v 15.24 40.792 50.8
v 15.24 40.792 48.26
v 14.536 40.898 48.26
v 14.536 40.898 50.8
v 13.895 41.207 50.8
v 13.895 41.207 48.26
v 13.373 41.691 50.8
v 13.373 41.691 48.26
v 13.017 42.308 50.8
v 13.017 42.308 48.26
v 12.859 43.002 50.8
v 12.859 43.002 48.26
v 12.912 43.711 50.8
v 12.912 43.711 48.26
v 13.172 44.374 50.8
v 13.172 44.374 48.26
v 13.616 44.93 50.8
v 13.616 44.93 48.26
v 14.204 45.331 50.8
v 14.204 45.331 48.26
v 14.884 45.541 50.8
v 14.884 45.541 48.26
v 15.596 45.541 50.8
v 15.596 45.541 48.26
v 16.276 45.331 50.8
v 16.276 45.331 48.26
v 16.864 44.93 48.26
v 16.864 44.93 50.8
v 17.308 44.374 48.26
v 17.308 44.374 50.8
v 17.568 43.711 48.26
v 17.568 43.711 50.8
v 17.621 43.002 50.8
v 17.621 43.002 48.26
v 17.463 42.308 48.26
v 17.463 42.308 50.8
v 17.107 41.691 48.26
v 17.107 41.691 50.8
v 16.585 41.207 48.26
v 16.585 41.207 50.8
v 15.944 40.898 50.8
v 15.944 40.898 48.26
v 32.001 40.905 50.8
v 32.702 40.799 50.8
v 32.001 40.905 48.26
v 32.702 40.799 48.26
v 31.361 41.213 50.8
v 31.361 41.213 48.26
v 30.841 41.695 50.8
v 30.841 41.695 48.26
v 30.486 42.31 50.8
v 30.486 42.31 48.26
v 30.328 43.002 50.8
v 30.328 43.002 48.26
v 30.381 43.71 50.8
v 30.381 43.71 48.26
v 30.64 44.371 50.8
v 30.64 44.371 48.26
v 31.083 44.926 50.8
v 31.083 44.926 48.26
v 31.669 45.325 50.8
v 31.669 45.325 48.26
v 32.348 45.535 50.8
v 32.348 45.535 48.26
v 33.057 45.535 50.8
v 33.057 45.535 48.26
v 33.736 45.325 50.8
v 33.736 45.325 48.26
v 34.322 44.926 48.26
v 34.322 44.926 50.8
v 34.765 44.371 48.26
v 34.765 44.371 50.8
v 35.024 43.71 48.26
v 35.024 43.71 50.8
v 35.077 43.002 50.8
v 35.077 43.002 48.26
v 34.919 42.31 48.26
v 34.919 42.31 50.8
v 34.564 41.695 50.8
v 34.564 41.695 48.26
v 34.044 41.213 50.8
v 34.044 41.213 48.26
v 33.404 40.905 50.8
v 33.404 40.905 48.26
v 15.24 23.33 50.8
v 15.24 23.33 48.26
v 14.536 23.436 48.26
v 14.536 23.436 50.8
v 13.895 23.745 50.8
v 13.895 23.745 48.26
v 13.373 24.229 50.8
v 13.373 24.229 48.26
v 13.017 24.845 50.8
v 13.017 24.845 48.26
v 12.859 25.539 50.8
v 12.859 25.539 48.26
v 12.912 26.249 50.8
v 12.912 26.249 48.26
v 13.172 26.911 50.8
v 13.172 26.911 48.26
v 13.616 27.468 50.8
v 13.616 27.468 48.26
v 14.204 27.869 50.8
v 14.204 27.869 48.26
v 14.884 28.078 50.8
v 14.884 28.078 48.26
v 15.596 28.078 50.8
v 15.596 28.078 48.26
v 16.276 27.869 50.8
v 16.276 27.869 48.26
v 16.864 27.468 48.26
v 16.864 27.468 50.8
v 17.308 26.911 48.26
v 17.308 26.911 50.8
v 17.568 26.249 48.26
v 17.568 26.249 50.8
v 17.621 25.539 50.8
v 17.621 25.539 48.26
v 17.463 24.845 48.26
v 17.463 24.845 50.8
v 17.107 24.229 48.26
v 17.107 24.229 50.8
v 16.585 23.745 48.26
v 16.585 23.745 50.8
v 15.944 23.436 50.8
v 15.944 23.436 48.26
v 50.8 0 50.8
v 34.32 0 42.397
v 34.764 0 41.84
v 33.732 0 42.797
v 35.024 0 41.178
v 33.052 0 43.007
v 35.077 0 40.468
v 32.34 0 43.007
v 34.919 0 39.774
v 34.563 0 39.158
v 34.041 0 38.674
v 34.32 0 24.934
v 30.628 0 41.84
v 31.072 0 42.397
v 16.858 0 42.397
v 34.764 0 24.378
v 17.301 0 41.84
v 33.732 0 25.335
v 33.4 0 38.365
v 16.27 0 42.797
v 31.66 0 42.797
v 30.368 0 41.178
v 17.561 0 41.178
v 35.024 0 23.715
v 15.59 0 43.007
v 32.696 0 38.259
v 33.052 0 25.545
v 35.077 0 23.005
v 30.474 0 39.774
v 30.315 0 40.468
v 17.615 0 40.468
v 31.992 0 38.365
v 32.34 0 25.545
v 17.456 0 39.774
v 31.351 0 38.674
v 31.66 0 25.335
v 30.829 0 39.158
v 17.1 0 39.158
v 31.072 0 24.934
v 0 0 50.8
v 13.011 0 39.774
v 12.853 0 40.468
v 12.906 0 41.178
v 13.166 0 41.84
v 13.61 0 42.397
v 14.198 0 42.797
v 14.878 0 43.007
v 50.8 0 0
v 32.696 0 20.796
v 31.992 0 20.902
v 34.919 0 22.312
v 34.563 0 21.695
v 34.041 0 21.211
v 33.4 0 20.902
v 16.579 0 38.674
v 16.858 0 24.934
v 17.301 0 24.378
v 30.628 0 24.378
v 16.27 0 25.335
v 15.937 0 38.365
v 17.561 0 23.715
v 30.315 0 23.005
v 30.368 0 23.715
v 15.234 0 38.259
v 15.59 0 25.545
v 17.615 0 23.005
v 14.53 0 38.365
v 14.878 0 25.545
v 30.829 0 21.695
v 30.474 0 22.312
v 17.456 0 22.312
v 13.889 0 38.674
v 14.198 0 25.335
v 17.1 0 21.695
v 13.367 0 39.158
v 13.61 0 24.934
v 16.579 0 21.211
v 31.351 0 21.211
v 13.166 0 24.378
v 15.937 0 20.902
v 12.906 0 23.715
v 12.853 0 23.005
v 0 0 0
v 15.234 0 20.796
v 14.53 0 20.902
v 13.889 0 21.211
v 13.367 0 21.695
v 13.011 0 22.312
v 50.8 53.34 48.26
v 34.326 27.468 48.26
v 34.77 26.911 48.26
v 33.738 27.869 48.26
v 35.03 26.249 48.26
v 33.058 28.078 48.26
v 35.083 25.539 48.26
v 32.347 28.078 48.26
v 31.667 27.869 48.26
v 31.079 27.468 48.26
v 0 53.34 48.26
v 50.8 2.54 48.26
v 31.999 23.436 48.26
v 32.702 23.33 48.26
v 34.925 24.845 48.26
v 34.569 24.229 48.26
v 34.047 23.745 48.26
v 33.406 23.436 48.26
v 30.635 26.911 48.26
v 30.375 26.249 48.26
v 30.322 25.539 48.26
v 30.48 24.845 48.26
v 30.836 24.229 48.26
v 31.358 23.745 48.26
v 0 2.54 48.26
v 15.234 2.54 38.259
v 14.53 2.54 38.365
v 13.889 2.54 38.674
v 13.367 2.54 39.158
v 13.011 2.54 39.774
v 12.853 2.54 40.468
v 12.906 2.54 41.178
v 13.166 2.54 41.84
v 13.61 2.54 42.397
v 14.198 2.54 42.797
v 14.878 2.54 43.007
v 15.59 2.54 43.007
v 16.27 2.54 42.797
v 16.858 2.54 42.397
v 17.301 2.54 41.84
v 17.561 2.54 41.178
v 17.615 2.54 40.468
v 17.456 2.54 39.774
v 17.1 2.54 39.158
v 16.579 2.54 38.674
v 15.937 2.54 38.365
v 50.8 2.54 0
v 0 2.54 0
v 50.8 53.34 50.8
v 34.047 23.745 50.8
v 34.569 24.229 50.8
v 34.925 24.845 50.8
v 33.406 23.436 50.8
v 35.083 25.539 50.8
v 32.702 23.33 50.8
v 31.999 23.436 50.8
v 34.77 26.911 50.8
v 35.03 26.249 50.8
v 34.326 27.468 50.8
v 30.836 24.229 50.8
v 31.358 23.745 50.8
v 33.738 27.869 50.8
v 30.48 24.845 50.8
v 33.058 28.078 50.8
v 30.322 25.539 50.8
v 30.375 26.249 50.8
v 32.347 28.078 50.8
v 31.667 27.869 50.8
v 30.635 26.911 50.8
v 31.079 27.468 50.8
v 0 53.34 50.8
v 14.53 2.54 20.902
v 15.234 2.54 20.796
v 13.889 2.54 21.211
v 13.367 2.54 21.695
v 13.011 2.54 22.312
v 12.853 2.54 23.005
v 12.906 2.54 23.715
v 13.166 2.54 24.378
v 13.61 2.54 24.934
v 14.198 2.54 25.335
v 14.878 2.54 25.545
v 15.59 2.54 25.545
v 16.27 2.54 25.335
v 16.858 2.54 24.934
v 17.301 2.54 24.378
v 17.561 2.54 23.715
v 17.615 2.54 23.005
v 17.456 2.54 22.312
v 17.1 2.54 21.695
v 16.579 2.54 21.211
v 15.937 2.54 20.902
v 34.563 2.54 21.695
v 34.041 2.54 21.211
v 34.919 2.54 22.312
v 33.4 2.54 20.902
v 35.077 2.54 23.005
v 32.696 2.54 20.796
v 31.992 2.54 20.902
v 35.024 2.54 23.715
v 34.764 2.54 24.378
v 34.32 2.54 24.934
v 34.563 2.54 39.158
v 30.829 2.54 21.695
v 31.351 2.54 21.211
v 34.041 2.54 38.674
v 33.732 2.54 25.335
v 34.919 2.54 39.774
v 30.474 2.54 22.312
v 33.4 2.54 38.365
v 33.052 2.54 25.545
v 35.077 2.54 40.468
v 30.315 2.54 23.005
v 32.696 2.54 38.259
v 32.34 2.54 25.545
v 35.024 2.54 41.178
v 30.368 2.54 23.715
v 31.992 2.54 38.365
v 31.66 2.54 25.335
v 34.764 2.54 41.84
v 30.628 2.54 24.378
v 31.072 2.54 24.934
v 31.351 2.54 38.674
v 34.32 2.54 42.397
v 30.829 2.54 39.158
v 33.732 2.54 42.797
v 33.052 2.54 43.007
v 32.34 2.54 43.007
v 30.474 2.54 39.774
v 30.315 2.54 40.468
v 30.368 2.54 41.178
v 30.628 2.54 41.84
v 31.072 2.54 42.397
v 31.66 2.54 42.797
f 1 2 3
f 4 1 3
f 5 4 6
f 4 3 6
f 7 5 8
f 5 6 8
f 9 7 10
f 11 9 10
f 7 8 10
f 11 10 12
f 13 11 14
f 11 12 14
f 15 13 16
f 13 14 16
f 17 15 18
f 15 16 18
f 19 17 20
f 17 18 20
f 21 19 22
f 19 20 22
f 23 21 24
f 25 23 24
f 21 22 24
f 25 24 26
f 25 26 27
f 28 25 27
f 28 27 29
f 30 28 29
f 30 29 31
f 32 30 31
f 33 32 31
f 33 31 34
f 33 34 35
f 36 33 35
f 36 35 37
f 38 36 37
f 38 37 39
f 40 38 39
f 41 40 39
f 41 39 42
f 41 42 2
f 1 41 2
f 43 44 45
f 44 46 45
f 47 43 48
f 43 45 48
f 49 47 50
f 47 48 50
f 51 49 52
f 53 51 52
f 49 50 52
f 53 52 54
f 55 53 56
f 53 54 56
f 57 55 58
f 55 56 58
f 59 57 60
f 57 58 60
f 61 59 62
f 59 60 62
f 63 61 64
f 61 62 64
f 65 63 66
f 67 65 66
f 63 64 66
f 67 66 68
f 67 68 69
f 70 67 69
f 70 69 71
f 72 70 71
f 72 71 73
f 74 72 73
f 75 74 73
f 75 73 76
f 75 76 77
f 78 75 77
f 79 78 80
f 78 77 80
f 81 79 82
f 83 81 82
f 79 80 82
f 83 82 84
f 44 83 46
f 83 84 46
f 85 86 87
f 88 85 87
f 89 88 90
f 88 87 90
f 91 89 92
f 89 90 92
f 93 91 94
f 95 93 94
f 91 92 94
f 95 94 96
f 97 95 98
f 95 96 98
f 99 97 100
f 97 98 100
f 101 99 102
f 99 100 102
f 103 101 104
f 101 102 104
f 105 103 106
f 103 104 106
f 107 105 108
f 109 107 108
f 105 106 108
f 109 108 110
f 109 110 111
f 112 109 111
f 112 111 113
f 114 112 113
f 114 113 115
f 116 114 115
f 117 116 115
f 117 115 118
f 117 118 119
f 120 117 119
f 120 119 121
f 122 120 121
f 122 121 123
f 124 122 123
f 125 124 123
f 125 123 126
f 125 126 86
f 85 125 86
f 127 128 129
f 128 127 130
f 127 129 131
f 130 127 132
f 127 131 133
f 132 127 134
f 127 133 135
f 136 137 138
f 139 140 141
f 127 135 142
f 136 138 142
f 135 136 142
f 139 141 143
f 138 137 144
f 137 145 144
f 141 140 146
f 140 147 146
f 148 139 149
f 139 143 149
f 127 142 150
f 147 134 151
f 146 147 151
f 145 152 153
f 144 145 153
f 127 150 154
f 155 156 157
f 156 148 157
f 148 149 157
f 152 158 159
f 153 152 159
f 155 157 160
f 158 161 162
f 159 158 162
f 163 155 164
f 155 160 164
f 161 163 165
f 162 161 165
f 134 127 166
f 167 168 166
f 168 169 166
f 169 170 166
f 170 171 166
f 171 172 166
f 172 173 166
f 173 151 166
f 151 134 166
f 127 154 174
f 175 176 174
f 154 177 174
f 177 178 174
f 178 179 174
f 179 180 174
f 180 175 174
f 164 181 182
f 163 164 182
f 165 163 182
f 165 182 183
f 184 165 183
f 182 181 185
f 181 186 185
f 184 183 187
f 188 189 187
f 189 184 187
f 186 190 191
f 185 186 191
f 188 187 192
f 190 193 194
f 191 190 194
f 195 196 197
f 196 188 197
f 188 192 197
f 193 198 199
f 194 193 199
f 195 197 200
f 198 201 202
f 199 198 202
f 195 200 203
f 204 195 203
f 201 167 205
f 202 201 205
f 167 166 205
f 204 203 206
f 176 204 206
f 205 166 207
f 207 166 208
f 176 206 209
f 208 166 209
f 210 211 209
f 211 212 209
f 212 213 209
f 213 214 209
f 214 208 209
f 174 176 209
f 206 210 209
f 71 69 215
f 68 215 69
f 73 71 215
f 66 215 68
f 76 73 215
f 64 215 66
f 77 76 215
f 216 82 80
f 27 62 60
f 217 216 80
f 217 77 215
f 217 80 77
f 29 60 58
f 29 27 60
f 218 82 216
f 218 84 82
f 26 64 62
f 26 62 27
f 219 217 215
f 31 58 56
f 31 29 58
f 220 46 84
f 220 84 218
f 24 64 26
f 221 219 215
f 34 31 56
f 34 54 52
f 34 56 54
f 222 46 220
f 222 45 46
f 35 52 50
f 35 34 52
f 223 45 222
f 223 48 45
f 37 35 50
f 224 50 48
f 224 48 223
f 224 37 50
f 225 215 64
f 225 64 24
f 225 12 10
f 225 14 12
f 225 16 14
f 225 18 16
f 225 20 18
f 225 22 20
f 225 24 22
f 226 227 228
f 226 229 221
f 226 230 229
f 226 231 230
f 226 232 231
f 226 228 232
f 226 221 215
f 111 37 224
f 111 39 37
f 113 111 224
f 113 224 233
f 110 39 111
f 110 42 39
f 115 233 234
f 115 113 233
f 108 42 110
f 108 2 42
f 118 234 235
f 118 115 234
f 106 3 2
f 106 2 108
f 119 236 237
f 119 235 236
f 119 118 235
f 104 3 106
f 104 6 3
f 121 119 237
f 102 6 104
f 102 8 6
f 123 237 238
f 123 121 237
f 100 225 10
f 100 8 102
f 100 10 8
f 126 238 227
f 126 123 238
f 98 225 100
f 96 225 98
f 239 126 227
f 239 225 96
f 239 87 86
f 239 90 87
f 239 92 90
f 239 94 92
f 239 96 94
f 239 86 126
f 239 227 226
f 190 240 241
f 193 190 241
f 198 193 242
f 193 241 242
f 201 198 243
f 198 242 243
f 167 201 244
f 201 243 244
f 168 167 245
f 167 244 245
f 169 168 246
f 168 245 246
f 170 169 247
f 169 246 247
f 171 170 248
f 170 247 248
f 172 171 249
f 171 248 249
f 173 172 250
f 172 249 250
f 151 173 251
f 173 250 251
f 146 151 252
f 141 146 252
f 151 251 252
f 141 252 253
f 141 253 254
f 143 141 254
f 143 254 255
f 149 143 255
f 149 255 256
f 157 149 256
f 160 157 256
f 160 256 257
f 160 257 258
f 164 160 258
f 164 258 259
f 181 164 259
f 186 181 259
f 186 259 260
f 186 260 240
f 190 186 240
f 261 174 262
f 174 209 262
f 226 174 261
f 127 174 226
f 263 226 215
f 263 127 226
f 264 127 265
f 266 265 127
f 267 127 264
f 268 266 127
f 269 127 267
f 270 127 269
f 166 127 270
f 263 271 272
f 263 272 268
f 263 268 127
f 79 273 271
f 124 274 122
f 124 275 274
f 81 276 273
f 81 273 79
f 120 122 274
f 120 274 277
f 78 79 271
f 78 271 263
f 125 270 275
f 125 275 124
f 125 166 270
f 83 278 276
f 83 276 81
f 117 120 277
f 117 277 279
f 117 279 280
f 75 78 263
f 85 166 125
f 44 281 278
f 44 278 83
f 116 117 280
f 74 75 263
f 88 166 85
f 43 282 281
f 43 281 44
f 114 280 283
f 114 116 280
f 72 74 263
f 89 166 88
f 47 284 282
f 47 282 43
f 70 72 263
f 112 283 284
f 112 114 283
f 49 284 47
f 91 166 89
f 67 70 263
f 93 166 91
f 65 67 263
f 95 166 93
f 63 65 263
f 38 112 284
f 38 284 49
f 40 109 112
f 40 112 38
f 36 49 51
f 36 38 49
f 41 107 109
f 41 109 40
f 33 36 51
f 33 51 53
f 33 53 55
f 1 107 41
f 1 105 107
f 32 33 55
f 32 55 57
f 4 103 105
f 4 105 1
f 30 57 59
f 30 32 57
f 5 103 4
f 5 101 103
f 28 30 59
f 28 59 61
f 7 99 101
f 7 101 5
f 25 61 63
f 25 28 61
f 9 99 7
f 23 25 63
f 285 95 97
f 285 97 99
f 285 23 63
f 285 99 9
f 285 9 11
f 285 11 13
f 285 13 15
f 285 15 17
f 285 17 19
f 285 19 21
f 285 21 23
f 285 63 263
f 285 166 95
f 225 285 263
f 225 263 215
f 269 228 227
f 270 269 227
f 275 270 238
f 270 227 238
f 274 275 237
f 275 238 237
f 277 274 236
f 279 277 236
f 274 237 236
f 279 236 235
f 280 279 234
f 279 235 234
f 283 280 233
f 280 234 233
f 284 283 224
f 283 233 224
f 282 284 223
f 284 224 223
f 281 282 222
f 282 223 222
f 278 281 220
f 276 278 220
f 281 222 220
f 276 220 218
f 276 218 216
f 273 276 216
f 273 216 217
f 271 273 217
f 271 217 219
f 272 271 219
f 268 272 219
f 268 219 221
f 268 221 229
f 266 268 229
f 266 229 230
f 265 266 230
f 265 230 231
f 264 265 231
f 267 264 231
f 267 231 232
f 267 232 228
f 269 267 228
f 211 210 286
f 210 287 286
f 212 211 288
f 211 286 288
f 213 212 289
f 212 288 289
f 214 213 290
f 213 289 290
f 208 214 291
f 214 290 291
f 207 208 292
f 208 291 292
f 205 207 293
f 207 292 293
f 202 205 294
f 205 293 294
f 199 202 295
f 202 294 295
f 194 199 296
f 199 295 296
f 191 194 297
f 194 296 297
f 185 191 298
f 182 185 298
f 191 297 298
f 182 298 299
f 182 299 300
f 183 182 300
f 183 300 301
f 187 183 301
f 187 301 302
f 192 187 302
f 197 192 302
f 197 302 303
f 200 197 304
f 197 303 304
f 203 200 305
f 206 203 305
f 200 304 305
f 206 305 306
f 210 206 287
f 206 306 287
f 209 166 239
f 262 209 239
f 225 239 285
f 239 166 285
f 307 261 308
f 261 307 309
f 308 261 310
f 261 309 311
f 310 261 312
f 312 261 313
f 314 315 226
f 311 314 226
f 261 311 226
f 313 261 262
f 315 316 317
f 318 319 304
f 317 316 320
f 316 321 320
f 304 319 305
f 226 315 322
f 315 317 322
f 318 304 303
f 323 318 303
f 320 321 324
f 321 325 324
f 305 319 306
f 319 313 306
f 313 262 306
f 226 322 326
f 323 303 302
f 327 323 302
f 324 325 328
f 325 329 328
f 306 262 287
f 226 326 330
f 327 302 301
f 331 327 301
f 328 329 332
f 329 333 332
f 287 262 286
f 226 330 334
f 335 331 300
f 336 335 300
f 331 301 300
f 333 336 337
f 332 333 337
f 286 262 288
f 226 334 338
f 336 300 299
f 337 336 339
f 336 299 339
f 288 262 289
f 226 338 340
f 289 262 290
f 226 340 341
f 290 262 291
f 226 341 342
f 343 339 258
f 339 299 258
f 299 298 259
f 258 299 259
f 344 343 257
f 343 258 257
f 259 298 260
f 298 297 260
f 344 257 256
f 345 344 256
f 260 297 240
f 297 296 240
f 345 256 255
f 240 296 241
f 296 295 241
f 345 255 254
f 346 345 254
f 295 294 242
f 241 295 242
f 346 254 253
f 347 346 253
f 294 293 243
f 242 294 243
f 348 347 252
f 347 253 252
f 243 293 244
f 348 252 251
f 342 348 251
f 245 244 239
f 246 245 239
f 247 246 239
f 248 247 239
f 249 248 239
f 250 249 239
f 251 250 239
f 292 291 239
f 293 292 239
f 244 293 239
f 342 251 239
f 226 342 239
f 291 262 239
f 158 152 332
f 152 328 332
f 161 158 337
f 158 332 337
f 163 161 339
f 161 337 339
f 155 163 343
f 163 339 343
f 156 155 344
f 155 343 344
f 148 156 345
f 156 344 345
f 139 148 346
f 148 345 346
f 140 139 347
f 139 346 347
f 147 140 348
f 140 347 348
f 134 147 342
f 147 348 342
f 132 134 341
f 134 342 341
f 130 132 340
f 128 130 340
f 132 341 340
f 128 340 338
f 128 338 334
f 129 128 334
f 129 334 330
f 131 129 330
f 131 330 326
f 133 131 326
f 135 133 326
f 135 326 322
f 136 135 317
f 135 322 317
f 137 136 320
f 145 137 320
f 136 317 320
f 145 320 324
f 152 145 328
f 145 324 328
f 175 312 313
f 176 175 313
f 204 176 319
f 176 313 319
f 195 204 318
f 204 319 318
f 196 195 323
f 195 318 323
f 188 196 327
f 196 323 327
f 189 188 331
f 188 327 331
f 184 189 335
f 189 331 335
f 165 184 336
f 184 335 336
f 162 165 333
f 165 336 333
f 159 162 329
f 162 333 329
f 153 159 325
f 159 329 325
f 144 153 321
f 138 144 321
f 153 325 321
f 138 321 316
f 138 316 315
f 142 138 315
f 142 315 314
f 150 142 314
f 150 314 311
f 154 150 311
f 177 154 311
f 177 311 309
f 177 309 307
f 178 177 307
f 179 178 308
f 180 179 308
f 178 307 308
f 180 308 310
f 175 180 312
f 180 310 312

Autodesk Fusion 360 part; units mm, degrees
sketch "Sketch1" plane through (0, 0, 0) normal (1, 0, 0) x (0, 1, 0)
  line L0 (0, 0) -> (2.54, 0)
  line L1 (2.54, 0) -> (2.54, 50.8)
  line L2 (2.54, 50.8) -> (0, 50.8)
  line L3 (0, 50.8) -> (0, 0)
  line L4 (0, 50.8) -> (53.34, 50.8)
  line L5 (53.34, 50.8) -> (53.34, 48.26)
  line L6 (53.34, 48.26) -> (0, 48.26)
  line L7 (0, 48.26) -> (0, 50.8)
  dimension "d5" = 2.54
  dimension "d6" = 50.8
  dimension "d7" = 53.34
  dimension "d8" = 2.54
extrude "Extrude1" add sketch "Sketch1" along normal blind 50.8 contours L1 L4 L5 L6
extrude "Extrude2" add sketch "Sketch1" along normal blind 50.8 contours L1 L2 L3 L4 L6 L7
extrude "Extrude3" add sketch "Sketch1" along normal blind 50.8 contours L0 L1 L3 L6
sketch "Sketch3" plane through (0, 0, 50.8) normal (0, 0, 1) x (-1, 0, 0)
  line L0 (0, -53.34) -> (0, 0)
  line L1 (0, 0) -> (-50.8, 0)
  line L2 (-50.8, 0) -> (-50.8, -53.34)
  line L3 (-50.8, -53.34) -> (0, -53.34)
  circle A0 centre (-15.24, -43.18) radius 2.3813
  circle A1 centre (-32.7025, -43.18) radius 2.3813
  circle A2 centre (-15.24, -25.7175) radius 2.3813
  circle A3 centre (-32.7025, -25.7175) radius 2.3813
  dimension "d15" = 17.4625
  dimension "d16" = 17.4625
  dimension "d17" = 4.7625
  dimension "d18" = 4.7625
  dimension "d19" = 4.7625
  dimension "d20" = 4.7625
hole "Hole1" at (32.7025, 43.18, 50.8) direction (0, 0, -1) diameter 4.7625 depth 22.86 tip angle 118
hole "Hole2" at (15.24, 43.18, 50.8) at (15.24, 25.7175, 50.8) at (32.7025, 25.7175, 50.8) direction (0, 0, -1) diameter 4.7752 depth 22.86 tip angle 118
sketch "Sketch4" plane through (0, 0, 0) normal (0, -1, 0) x (1, 0, 0)
  line L0 (0, 50.8) -> (0, 0)
  line L1 (0, 0) -> (50.8, 0)
  line L2 (50.8, 0) -> (50.8, 50.8)
  line L3 (50.8, 50.8) -> (0, 50.8)
  line L4 (0, 50.8) -> (15.2337, 50.8)
  line L5 (15.2337, 50.8) -> (15.2337, 40.6463)
  line L6 (15.2337, 40.6463) -> (32.6962, 40.6463)
  line L7 (32.6962, 40.6463) -> (32.6962, 23.1838)
  line L8 (32.6962, 23.1838) -> (15.2337, 23.1838)
  line L9 (15.2337, 23.1838) -> (15.2337, 40.6463)
  circle A0 centre (15.2337, 40.6463) radius 2.3812
  circle A1 centre (32.6962, 40.6463) radius 2.3812
  circle A2 centre (15.2337, 23.1838) radius 2.3813
  circle A3 centre (32.6962, 23.1838) radius 2.3812
  dimension "d42" = 15.2336
  dimension "d43" = 10.1537
  dimension "d44" = 17.4625
  dimension "d45" = 17.4625
  dimension "d46" = 4.7625
  dimension "d47" = 4.7625
  dimension "d48" = 4.7625
  dimension "d49" = 4.7625
hole "Hole3" at (15.2337, 0, 40.6463) at (15.2337, 0, 23.1838) at (32.6962, 0, 40.6463) at (32.6962, 0, 23.1838) direction (0, 1, 0) diameter 4.7752 depth 22.86 tip angle 118
sketch "Sketch6" plane through (50.8, 0, 0) normal (1, 0, 0) x (0, 1, 0)
  line L0 (53.34, 48.26) -> (53.34, 50.8)
  line L1 (53.34, 50.8) -> (0, 50.8)
  line L2 (0, 50.8) -> (0, 0)
  line L3 (0, 0) -> (2.54, 0)
  line L4 (2.54, 0) -> (2.54, 48.26)
  line L5 (2.54, 48.26) -> (53.34, 48.26)
equation "d15 = ( 11 / 16 ) * 1 in"
equation "d16 = ( 11 / 16 ) * 1 in"
equation "d17 = ( 3 / 16 ) * 1 in"
equation "d18 = ( 3 / 16 ) * 1 in"
equation "d19 = ( 3 / 16 ) * 1 in"
equation "d20 = ( 3 / 16 ) * 1 in"
equation "d42 = 0.506 in + ( 3 / 32 ) * 1 in"
equation "d43 = 0.306 in + ( 3 / 32 ) * 1 in"
equation "d44 = ( 11 / 16 ) * 1 in"
equation "d45 = ( 11 / 16 ) * 1 in"
equation "d46 = ( 3 / 16 ) * 1 in"
equation "d47 = ( 3 / 16 ) * 1 in"
equation "d48 = ( 3 / 16 ) * 1 in"
equation "d49 = ( 3 / 16 ) * 1 in"
